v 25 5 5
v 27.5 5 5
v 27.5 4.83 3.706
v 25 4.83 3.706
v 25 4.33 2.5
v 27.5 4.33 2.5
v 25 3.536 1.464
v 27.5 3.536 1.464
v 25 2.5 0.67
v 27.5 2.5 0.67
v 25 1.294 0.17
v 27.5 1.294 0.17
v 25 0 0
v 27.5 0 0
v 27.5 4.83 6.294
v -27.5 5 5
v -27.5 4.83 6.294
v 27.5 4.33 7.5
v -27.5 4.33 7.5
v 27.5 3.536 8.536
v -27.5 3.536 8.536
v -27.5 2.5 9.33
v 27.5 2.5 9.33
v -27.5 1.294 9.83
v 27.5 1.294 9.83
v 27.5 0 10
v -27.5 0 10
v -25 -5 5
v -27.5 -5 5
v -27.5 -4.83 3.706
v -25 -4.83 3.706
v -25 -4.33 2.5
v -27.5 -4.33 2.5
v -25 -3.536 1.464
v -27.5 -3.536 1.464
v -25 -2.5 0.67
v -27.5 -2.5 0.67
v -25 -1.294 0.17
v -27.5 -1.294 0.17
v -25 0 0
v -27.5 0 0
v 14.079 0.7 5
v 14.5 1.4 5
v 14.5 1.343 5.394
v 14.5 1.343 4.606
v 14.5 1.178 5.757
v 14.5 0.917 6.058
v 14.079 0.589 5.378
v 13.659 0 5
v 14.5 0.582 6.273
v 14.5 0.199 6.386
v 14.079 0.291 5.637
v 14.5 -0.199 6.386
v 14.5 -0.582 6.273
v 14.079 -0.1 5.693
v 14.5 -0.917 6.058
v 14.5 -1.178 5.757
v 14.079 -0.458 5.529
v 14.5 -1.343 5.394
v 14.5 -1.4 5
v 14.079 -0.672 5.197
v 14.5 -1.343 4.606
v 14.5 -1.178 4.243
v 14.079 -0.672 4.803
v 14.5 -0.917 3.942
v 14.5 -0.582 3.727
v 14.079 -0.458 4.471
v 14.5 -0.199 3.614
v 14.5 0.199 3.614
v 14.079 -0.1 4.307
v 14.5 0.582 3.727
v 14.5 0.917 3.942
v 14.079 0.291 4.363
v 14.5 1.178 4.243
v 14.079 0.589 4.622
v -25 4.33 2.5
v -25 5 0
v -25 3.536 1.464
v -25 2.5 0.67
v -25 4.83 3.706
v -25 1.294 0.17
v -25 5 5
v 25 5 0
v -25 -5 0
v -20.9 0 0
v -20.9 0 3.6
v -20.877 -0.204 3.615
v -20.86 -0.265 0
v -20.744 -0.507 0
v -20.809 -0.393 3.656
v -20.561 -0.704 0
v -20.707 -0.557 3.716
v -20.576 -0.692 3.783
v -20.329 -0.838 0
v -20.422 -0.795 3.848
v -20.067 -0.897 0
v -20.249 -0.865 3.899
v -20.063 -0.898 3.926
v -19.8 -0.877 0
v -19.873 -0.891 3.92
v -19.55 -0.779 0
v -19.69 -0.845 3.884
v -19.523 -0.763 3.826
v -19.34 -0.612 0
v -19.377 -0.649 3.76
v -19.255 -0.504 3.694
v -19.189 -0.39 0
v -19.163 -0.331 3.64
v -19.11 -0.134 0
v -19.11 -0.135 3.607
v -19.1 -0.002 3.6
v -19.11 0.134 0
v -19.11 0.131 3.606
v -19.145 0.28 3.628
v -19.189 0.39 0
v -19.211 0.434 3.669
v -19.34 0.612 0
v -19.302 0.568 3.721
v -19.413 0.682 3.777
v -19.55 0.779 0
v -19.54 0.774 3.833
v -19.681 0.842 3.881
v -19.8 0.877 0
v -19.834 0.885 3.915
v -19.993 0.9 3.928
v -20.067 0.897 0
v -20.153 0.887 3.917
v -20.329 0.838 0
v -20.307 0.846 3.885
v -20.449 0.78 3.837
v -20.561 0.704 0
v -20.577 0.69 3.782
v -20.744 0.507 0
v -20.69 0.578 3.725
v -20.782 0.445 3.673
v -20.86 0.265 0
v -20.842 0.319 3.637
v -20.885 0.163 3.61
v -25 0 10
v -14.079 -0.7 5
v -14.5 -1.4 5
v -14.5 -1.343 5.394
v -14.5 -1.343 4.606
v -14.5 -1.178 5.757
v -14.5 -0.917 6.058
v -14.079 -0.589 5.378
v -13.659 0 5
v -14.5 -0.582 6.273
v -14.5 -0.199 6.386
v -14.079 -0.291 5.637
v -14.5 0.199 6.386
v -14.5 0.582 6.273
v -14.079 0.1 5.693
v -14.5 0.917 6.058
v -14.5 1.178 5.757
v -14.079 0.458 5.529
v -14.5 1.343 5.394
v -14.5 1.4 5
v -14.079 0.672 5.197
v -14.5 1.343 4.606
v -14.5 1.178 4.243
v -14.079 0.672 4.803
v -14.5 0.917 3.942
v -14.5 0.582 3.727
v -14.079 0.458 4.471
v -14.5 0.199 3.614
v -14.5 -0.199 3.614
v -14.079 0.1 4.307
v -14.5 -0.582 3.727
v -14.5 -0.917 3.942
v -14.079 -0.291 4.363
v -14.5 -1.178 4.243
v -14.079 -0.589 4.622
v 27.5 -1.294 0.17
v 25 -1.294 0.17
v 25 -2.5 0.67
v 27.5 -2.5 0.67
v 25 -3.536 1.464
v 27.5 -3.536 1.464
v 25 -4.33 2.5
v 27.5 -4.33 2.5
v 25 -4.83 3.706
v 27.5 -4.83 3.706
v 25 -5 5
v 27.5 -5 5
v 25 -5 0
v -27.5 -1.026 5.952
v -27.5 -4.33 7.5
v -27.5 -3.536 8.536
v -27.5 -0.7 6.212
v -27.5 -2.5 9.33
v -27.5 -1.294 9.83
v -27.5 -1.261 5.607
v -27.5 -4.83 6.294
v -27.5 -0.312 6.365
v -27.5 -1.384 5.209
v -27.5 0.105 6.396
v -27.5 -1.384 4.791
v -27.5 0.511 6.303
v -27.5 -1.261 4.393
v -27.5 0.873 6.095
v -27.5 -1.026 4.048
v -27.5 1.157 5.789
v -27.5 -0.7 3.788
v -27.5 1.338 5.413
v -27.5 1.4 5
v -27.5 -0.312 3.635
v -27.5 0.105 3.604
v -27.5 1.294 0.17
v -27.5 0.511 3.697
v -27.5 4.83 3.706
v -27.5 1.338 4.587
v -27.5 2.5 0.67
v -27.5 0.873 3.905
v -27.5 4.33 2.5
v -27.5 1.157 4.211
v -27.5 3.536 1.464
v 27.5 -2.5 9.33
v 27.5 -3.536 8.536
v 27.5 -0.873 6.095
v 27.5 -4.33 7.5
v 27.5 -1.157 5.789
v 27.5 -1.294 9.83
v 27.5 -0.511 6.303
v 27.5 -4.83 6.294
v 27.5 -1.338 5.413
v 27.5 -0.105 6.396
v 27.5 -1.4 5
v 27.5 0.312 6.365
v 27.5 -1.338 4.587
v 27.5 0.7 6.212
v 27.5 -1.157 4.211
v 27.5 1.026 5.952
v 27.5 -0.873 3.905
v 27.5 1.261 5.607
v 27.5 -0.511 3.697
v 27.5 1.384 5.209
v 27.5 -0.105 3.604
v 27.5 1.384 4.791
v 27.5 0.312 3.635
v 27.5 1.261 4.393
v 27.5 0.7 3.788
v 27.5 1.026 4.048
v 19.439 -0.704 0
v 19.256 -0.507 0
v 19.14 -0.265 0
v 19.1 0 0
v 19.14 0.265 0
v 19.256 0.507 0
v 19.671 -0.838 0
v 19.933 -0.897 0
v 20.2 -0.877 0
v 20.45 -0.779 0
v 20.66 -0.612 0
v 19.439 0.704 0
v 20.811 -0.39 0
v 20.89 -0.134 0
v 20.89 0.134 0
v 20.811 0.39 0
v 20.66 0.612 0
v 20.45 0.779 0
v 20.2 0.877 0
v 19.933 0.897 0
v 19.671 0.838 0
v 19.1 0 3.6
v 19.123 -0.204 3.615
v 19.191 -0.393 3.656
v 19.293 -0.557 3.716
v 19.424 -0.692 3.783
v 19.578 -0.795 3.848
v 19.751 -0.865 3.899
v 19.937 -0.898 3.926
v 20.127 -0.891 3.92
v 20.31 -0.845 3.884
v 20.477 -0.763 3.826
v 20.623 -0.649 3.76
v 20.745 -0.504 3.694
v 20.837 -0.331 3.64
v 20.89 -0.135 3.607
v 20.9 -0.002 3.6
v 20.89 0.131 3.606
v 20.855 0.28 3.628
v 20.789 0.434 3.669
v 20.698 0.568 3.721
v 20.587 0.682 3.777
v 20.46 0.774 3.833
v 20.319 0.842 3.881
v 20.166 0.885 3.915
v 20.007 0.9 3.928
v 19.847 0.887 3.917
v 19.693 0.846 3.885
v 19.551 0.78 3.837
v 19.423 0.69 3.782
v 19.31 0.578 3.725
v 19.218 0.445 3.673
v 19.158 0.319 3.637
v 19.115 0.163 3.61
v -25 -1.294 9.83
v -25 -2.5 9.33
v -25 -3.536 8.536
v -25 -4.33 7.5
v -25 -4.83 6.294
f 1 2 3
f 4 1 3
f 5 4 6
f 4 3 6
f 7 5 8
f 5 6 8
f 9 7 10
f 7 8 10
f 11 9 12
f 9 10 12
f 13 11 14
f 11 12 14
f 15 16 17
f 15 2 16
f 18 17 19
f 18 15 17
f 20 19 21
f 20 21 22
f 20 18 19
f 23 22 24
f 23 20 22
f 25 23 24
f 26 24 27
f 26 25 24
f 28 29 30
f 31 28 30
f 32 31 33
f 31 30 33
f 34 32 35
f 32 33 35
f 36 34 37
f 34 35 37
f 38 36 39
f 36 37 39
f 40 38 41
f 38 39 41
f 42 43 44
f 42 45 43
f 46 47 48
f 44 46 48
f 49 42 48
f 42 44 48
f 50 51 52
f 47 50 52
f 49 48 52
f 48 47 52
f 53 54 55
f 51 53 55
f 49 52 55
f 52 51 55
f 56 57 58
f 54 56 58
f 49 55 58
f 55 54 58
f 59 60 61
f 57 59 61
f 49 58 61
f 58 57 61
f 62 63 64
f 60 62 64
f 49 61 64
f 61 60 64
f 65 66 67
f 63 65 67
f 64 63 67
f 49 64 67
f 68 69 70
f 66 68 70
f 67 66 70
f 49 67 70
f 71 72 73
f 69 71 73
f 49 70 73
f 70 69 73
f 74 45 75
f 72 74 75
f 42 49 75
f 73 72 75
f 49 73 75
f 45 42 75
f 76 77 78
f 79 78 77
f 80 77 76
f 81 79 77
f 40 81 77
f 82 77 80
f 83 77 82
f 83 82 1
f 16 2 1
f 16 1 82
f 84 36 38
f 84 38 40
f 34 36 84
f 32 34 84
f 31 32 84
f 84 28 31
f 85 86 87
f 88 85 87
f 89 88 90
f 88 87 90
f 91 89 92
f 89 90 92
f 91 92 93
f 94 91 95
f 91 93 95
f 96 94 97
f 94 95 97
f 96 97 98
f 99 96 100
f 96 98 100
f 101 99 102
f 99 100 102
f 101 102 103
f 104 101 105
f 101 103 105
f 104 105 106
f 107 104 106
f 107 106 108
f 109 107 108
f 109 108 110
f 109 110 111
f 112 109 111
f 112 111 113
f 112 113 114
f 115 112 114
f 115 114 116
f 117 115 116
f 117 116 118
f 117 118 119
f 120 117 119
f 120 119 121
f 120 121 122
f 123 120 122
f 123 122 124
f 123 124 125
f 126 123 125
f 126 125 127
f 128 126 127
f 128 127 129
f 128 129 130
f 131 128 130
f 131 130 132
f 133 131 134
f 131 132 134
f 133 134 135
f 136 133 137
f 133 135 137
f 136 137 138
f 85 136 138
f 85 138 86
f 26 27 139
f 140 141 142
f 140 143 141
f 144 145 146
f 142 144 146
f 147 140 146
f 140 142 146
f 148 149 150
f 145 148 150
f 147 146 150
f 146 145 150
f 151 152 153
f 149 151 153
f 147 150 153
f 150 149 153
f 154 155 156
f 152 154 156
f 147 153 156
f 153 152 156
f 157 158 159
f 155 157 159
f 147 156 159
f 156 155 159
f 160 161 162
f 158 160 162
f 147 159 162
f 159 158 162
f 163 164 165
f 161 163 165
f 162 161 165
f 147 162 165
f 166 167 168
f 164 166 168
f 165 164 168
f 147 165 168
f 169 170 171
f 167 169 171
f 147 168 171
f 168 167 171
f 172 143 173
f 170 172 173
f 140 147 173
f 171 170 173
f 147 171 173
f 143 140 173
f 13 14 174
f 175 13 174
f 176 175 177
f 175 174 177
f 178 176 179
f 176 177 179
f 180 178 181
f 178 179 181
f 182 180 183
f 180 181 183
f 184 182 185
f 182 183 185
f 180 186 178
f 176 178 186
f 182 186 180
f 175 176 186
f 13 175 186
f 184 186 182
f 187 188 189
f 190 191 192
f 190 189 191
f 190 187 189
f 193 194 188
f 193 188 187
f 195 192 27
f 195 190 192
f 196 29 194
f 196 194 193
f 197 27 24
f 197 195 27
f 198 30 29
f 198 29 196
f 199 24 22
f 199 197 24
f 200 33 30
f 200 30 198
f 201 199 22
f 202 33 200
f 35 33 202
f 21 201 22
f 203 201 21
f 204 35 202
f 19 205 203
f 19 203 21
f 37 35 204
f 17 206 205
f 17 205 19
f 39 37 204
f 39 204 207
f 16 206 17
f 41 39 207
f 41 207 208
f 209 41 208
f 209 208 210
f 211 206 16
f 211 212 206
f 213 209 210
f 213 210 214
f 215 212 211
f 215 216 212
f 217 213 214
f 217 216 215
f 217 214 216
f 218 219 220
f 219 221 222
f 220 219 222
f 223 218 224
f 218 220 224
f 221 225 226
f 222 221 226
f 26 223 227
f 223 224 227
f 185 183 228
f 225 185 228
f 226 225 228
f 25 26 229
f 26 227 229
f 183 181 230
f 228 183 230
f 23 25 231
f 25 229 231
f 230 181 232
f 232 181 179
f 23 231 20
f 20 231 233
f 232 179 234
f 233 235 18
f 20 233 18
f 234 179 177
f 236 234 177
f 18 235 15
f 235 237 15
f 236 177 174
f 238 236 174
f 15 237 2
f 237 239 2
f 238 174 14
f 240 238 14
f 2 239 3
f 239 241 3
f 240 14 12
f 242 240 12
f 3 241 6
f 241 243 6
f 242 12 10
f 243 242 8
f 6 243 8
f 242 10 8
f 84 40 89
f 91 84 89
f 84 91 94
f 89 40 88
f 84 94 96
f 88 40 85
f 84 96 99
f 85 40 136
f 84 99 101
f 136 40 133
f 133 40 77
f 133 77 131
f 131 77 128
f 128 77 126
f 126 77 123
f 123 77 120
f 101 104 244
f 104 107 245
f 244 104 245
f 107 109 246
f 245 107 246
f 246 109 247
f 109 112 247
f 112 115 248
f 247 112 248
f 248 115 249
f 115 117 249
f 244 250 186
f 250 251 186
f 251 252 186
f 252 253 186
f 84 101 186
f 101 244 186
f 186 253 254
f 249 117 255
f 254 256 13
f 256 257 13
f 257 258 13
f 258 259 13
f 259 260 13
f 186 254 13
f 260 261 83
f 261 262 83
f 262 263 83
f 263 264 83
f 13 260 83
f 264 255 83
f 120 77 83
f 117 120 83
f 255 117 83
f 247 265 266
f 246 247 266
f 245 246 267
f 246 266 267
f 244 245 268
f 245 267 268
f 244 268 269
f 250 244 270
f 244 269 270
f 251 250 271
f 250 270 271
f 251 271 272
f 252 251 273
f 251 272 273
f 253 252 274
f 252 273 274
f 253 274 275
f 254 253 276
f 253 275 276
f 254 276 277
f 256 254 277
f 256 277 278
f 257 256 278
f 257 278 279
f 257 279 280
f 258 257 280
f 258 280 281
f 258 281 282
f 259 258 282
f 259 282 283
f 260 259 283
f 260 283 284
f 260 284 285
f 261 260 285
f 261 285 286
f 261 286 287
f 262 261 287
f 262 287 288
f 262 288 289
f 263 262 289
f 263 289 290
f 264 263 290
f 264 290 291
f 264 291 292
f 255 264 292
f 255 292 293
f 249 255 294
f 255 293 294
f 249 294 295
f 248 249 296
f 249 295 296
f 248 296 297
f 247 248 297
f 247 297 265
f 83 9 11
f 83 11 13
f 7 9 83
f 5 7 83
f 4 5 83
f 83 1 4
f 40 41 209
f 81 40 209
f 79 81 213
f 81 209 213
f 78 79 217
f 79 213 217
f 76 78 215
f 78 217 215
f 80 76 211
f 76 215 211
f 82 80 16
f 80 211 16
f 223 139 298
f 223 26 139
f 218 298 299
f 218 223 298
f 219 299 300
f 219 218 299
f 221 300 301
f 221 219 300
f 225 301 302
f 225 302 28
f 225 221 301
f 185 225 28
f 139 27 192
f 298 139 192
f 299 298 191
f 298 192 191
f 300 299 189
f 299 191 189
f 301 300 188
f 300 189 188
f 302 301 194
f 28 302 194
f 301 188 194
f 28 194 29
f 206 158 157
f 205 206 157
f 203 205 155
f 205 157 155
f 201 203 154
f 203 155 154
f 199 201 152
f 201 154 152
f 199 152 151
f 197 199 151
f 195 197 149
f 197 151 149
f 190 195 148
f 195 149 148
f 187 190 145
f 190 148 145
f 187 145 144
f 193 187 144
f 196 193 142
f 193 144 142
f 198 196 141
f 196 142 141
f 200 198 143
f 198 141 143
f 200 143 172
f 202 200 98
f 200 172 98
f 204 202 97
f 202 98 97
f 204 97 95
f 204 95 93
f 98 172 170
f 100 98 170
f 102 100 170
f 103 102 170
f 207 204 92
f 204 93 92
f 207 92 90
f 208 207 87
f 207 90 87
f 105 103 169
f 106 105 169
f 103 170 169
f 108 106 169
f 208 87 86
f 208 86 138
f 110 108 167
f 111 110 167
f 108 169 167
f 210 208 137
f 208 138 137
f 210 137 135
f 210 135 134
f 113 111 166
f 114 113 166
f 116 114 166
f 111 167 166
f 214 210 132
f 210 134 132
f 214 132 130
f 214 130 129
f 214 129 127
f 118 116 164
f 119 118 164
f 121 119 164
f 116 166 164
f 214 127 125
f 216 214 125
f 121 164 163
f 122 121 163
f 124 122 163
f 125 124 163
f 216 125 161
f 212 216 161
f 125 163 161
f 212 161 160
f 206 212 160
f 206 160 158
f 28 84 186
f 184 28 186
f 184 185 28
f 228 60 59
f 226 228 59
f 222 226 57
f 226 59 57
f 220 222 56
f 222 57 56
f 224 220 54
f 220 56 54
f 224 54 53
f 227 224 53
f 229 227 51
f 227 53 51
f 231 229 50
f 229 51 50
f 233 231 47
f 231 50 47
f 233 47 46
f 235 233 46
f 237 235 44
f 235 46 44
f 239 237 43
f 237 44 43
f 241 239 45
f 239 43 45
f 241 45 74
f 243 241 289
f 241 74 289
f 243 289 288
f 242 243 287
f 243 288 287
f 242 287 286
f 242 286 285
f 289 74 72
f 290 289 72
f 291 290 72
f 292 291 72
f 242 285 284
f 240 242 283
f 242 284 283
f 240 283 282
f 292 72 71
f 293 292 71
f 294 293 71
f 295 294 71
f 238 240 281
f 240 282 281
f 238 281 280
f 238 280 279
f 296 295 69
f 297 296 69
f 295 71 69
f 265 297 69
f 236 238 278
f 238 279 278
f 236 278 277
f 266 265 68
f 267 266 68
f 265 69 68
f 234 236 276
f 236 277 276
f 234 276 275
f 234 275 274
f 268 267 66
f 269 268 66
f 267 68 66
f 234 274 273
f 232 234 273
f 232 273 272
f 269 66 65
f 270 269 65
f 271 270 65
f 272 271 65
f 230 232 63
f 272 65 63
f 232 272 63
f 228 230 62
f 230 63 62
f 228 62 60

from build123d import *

# Parameters (mm, degrees)
F0_W      = 55
F0_H      = 10
F1_DEPTH  = 10
F3_D      = 2.8
F3_DEPTH  = 13
F3_TIP    = 0.8412048666
F5_D      = 2.8
F5_DEPTH  = 13
F5_TIP    = 0.8412048666
F7_DEPTH  = 2.5
F9_DEPTH  = 2.5
F10_R     = 4.9999
F12_D     = 1.8
F12_DEPTH = 5
F12_TIP   = 0.5407745571


# Not quite as in the source:
# - a fillet or chamfer is up to 0.001 mm smaller than in the source, because OpenCascade refuses the exact size
# - a feature names something its author has since deleted; it is built from what else it names


with BuildPart() as f1:
    # F0 (on Top) → F1 (new body)
    with BuildSketch(Plane.XY):
        Rectangle(F0_W, F0_H)
    extrude(amount=F1_DEPTH)

    # F3
    with Locations(Plane(origin=(-27.5, 0, 0), x_dir=(0, -1, 0), z_dir=(-1, 0, 0))):
        with Locations((0, 5)):
            Hole(F3_D / 2, depth=F3_DEPTH)
            with Locations((0, 0, -(F3_DEPTH + F3_TIP / 2))):  # 118° drill point
                Cone(0, F3_D / 2, F3_TIP, mode=Mode.SUBTRACT)

    # F5
    with Locations(Plane.YZ.offset(27.5)):
        with Locations((0, 5)):
            Hole(F5_D / 2, depth=F5_DEPTH)
            with Locations((0, 0, -(F5_DEPTH + F5_TIP / 2))):  # 118° drill point
                Cone(0, F5_D / 2, F5_TIP, mode=Mode.SUBTRACT)

    # F6 (on face) → F7 (cut)
    with BuildSketch(Plane.YZ.offset(27.5)):
        with BuildLine():
            Line((5, 0), (5, 5))
            ThreePointArc((5, 5), (3.5355339059, 1.4644660941), (0, 0))
            Line((0, 0), (5, 0))
        make_face()
        with BuildLine():
            Line((-5, 0), (0, 0))
            ThreePointArc((0, 0), (-3.5355339059, 1.4644660941), (-5, 5))
            Line((-5, 5), (-5, 0))
        make_face()
    extrude(amount=-F7_DEPTH, mode=Mode.SUBTRACT)

    # F8 (on face) → F9 (cut)
    with BuildSketch(Plane(origin=(-27.5, 0, 0), x_dir=(0, -1, 0), z_dir=(-1, 0, 0))):
        with BuildLine():
            Line((5, 0), (5, 5))
            ThreePointArc((5, 5), (3.5355339059, 1.4644660941), (0, 0))
            Line((0, 0), (5, 0))
        make_face()
        with BuildLine():
            ThreePointArc((0, 10), (3.5355339059, 8.5355339059), (5, 5))
            Line((5, 5), (5, 10))
            Line((5, 10), (0, 10))
        make_face()
        with BuildLine():
            Line((-5, 0), (0, 0))
            ThreePointArc((0, 0), (-3.5355339059, 1.4644660941), (-5, 5))
            Line((-5, 5), (-5, 0))
        make_face()
    extrude(amount=-F9_DEPTH, mode=Mode.SUBTRACT)

    # F10 (radius 5 in the source; OpenCascade refuses exactly that, so slightly less here)
    f10_edges = [f1.edges().sort_by_distance(p)[0] for p in [
        (0, 5, 10),
        (1.25, -5, 10),
    ]]
    fillet(f10_edges, radius=F10_R)

    # F12
    with Locations(Plane(origin=(0, 0, 0), x_dir=(1, 0, 0), z_dir=(0, 0, -1))):
        with Locations((-20, 0), (20, 0)):
            Hole(F12_D / 2, depth=F12_DEPTH)
            with Locations((0, 0, -(F12_DEPTH + F12_TIP / 2))):  # 118° drill point
                Cone(0, F12_D / 2, F12_TIP, mode=Mode.SUBTRACT)


solid = f1.part
